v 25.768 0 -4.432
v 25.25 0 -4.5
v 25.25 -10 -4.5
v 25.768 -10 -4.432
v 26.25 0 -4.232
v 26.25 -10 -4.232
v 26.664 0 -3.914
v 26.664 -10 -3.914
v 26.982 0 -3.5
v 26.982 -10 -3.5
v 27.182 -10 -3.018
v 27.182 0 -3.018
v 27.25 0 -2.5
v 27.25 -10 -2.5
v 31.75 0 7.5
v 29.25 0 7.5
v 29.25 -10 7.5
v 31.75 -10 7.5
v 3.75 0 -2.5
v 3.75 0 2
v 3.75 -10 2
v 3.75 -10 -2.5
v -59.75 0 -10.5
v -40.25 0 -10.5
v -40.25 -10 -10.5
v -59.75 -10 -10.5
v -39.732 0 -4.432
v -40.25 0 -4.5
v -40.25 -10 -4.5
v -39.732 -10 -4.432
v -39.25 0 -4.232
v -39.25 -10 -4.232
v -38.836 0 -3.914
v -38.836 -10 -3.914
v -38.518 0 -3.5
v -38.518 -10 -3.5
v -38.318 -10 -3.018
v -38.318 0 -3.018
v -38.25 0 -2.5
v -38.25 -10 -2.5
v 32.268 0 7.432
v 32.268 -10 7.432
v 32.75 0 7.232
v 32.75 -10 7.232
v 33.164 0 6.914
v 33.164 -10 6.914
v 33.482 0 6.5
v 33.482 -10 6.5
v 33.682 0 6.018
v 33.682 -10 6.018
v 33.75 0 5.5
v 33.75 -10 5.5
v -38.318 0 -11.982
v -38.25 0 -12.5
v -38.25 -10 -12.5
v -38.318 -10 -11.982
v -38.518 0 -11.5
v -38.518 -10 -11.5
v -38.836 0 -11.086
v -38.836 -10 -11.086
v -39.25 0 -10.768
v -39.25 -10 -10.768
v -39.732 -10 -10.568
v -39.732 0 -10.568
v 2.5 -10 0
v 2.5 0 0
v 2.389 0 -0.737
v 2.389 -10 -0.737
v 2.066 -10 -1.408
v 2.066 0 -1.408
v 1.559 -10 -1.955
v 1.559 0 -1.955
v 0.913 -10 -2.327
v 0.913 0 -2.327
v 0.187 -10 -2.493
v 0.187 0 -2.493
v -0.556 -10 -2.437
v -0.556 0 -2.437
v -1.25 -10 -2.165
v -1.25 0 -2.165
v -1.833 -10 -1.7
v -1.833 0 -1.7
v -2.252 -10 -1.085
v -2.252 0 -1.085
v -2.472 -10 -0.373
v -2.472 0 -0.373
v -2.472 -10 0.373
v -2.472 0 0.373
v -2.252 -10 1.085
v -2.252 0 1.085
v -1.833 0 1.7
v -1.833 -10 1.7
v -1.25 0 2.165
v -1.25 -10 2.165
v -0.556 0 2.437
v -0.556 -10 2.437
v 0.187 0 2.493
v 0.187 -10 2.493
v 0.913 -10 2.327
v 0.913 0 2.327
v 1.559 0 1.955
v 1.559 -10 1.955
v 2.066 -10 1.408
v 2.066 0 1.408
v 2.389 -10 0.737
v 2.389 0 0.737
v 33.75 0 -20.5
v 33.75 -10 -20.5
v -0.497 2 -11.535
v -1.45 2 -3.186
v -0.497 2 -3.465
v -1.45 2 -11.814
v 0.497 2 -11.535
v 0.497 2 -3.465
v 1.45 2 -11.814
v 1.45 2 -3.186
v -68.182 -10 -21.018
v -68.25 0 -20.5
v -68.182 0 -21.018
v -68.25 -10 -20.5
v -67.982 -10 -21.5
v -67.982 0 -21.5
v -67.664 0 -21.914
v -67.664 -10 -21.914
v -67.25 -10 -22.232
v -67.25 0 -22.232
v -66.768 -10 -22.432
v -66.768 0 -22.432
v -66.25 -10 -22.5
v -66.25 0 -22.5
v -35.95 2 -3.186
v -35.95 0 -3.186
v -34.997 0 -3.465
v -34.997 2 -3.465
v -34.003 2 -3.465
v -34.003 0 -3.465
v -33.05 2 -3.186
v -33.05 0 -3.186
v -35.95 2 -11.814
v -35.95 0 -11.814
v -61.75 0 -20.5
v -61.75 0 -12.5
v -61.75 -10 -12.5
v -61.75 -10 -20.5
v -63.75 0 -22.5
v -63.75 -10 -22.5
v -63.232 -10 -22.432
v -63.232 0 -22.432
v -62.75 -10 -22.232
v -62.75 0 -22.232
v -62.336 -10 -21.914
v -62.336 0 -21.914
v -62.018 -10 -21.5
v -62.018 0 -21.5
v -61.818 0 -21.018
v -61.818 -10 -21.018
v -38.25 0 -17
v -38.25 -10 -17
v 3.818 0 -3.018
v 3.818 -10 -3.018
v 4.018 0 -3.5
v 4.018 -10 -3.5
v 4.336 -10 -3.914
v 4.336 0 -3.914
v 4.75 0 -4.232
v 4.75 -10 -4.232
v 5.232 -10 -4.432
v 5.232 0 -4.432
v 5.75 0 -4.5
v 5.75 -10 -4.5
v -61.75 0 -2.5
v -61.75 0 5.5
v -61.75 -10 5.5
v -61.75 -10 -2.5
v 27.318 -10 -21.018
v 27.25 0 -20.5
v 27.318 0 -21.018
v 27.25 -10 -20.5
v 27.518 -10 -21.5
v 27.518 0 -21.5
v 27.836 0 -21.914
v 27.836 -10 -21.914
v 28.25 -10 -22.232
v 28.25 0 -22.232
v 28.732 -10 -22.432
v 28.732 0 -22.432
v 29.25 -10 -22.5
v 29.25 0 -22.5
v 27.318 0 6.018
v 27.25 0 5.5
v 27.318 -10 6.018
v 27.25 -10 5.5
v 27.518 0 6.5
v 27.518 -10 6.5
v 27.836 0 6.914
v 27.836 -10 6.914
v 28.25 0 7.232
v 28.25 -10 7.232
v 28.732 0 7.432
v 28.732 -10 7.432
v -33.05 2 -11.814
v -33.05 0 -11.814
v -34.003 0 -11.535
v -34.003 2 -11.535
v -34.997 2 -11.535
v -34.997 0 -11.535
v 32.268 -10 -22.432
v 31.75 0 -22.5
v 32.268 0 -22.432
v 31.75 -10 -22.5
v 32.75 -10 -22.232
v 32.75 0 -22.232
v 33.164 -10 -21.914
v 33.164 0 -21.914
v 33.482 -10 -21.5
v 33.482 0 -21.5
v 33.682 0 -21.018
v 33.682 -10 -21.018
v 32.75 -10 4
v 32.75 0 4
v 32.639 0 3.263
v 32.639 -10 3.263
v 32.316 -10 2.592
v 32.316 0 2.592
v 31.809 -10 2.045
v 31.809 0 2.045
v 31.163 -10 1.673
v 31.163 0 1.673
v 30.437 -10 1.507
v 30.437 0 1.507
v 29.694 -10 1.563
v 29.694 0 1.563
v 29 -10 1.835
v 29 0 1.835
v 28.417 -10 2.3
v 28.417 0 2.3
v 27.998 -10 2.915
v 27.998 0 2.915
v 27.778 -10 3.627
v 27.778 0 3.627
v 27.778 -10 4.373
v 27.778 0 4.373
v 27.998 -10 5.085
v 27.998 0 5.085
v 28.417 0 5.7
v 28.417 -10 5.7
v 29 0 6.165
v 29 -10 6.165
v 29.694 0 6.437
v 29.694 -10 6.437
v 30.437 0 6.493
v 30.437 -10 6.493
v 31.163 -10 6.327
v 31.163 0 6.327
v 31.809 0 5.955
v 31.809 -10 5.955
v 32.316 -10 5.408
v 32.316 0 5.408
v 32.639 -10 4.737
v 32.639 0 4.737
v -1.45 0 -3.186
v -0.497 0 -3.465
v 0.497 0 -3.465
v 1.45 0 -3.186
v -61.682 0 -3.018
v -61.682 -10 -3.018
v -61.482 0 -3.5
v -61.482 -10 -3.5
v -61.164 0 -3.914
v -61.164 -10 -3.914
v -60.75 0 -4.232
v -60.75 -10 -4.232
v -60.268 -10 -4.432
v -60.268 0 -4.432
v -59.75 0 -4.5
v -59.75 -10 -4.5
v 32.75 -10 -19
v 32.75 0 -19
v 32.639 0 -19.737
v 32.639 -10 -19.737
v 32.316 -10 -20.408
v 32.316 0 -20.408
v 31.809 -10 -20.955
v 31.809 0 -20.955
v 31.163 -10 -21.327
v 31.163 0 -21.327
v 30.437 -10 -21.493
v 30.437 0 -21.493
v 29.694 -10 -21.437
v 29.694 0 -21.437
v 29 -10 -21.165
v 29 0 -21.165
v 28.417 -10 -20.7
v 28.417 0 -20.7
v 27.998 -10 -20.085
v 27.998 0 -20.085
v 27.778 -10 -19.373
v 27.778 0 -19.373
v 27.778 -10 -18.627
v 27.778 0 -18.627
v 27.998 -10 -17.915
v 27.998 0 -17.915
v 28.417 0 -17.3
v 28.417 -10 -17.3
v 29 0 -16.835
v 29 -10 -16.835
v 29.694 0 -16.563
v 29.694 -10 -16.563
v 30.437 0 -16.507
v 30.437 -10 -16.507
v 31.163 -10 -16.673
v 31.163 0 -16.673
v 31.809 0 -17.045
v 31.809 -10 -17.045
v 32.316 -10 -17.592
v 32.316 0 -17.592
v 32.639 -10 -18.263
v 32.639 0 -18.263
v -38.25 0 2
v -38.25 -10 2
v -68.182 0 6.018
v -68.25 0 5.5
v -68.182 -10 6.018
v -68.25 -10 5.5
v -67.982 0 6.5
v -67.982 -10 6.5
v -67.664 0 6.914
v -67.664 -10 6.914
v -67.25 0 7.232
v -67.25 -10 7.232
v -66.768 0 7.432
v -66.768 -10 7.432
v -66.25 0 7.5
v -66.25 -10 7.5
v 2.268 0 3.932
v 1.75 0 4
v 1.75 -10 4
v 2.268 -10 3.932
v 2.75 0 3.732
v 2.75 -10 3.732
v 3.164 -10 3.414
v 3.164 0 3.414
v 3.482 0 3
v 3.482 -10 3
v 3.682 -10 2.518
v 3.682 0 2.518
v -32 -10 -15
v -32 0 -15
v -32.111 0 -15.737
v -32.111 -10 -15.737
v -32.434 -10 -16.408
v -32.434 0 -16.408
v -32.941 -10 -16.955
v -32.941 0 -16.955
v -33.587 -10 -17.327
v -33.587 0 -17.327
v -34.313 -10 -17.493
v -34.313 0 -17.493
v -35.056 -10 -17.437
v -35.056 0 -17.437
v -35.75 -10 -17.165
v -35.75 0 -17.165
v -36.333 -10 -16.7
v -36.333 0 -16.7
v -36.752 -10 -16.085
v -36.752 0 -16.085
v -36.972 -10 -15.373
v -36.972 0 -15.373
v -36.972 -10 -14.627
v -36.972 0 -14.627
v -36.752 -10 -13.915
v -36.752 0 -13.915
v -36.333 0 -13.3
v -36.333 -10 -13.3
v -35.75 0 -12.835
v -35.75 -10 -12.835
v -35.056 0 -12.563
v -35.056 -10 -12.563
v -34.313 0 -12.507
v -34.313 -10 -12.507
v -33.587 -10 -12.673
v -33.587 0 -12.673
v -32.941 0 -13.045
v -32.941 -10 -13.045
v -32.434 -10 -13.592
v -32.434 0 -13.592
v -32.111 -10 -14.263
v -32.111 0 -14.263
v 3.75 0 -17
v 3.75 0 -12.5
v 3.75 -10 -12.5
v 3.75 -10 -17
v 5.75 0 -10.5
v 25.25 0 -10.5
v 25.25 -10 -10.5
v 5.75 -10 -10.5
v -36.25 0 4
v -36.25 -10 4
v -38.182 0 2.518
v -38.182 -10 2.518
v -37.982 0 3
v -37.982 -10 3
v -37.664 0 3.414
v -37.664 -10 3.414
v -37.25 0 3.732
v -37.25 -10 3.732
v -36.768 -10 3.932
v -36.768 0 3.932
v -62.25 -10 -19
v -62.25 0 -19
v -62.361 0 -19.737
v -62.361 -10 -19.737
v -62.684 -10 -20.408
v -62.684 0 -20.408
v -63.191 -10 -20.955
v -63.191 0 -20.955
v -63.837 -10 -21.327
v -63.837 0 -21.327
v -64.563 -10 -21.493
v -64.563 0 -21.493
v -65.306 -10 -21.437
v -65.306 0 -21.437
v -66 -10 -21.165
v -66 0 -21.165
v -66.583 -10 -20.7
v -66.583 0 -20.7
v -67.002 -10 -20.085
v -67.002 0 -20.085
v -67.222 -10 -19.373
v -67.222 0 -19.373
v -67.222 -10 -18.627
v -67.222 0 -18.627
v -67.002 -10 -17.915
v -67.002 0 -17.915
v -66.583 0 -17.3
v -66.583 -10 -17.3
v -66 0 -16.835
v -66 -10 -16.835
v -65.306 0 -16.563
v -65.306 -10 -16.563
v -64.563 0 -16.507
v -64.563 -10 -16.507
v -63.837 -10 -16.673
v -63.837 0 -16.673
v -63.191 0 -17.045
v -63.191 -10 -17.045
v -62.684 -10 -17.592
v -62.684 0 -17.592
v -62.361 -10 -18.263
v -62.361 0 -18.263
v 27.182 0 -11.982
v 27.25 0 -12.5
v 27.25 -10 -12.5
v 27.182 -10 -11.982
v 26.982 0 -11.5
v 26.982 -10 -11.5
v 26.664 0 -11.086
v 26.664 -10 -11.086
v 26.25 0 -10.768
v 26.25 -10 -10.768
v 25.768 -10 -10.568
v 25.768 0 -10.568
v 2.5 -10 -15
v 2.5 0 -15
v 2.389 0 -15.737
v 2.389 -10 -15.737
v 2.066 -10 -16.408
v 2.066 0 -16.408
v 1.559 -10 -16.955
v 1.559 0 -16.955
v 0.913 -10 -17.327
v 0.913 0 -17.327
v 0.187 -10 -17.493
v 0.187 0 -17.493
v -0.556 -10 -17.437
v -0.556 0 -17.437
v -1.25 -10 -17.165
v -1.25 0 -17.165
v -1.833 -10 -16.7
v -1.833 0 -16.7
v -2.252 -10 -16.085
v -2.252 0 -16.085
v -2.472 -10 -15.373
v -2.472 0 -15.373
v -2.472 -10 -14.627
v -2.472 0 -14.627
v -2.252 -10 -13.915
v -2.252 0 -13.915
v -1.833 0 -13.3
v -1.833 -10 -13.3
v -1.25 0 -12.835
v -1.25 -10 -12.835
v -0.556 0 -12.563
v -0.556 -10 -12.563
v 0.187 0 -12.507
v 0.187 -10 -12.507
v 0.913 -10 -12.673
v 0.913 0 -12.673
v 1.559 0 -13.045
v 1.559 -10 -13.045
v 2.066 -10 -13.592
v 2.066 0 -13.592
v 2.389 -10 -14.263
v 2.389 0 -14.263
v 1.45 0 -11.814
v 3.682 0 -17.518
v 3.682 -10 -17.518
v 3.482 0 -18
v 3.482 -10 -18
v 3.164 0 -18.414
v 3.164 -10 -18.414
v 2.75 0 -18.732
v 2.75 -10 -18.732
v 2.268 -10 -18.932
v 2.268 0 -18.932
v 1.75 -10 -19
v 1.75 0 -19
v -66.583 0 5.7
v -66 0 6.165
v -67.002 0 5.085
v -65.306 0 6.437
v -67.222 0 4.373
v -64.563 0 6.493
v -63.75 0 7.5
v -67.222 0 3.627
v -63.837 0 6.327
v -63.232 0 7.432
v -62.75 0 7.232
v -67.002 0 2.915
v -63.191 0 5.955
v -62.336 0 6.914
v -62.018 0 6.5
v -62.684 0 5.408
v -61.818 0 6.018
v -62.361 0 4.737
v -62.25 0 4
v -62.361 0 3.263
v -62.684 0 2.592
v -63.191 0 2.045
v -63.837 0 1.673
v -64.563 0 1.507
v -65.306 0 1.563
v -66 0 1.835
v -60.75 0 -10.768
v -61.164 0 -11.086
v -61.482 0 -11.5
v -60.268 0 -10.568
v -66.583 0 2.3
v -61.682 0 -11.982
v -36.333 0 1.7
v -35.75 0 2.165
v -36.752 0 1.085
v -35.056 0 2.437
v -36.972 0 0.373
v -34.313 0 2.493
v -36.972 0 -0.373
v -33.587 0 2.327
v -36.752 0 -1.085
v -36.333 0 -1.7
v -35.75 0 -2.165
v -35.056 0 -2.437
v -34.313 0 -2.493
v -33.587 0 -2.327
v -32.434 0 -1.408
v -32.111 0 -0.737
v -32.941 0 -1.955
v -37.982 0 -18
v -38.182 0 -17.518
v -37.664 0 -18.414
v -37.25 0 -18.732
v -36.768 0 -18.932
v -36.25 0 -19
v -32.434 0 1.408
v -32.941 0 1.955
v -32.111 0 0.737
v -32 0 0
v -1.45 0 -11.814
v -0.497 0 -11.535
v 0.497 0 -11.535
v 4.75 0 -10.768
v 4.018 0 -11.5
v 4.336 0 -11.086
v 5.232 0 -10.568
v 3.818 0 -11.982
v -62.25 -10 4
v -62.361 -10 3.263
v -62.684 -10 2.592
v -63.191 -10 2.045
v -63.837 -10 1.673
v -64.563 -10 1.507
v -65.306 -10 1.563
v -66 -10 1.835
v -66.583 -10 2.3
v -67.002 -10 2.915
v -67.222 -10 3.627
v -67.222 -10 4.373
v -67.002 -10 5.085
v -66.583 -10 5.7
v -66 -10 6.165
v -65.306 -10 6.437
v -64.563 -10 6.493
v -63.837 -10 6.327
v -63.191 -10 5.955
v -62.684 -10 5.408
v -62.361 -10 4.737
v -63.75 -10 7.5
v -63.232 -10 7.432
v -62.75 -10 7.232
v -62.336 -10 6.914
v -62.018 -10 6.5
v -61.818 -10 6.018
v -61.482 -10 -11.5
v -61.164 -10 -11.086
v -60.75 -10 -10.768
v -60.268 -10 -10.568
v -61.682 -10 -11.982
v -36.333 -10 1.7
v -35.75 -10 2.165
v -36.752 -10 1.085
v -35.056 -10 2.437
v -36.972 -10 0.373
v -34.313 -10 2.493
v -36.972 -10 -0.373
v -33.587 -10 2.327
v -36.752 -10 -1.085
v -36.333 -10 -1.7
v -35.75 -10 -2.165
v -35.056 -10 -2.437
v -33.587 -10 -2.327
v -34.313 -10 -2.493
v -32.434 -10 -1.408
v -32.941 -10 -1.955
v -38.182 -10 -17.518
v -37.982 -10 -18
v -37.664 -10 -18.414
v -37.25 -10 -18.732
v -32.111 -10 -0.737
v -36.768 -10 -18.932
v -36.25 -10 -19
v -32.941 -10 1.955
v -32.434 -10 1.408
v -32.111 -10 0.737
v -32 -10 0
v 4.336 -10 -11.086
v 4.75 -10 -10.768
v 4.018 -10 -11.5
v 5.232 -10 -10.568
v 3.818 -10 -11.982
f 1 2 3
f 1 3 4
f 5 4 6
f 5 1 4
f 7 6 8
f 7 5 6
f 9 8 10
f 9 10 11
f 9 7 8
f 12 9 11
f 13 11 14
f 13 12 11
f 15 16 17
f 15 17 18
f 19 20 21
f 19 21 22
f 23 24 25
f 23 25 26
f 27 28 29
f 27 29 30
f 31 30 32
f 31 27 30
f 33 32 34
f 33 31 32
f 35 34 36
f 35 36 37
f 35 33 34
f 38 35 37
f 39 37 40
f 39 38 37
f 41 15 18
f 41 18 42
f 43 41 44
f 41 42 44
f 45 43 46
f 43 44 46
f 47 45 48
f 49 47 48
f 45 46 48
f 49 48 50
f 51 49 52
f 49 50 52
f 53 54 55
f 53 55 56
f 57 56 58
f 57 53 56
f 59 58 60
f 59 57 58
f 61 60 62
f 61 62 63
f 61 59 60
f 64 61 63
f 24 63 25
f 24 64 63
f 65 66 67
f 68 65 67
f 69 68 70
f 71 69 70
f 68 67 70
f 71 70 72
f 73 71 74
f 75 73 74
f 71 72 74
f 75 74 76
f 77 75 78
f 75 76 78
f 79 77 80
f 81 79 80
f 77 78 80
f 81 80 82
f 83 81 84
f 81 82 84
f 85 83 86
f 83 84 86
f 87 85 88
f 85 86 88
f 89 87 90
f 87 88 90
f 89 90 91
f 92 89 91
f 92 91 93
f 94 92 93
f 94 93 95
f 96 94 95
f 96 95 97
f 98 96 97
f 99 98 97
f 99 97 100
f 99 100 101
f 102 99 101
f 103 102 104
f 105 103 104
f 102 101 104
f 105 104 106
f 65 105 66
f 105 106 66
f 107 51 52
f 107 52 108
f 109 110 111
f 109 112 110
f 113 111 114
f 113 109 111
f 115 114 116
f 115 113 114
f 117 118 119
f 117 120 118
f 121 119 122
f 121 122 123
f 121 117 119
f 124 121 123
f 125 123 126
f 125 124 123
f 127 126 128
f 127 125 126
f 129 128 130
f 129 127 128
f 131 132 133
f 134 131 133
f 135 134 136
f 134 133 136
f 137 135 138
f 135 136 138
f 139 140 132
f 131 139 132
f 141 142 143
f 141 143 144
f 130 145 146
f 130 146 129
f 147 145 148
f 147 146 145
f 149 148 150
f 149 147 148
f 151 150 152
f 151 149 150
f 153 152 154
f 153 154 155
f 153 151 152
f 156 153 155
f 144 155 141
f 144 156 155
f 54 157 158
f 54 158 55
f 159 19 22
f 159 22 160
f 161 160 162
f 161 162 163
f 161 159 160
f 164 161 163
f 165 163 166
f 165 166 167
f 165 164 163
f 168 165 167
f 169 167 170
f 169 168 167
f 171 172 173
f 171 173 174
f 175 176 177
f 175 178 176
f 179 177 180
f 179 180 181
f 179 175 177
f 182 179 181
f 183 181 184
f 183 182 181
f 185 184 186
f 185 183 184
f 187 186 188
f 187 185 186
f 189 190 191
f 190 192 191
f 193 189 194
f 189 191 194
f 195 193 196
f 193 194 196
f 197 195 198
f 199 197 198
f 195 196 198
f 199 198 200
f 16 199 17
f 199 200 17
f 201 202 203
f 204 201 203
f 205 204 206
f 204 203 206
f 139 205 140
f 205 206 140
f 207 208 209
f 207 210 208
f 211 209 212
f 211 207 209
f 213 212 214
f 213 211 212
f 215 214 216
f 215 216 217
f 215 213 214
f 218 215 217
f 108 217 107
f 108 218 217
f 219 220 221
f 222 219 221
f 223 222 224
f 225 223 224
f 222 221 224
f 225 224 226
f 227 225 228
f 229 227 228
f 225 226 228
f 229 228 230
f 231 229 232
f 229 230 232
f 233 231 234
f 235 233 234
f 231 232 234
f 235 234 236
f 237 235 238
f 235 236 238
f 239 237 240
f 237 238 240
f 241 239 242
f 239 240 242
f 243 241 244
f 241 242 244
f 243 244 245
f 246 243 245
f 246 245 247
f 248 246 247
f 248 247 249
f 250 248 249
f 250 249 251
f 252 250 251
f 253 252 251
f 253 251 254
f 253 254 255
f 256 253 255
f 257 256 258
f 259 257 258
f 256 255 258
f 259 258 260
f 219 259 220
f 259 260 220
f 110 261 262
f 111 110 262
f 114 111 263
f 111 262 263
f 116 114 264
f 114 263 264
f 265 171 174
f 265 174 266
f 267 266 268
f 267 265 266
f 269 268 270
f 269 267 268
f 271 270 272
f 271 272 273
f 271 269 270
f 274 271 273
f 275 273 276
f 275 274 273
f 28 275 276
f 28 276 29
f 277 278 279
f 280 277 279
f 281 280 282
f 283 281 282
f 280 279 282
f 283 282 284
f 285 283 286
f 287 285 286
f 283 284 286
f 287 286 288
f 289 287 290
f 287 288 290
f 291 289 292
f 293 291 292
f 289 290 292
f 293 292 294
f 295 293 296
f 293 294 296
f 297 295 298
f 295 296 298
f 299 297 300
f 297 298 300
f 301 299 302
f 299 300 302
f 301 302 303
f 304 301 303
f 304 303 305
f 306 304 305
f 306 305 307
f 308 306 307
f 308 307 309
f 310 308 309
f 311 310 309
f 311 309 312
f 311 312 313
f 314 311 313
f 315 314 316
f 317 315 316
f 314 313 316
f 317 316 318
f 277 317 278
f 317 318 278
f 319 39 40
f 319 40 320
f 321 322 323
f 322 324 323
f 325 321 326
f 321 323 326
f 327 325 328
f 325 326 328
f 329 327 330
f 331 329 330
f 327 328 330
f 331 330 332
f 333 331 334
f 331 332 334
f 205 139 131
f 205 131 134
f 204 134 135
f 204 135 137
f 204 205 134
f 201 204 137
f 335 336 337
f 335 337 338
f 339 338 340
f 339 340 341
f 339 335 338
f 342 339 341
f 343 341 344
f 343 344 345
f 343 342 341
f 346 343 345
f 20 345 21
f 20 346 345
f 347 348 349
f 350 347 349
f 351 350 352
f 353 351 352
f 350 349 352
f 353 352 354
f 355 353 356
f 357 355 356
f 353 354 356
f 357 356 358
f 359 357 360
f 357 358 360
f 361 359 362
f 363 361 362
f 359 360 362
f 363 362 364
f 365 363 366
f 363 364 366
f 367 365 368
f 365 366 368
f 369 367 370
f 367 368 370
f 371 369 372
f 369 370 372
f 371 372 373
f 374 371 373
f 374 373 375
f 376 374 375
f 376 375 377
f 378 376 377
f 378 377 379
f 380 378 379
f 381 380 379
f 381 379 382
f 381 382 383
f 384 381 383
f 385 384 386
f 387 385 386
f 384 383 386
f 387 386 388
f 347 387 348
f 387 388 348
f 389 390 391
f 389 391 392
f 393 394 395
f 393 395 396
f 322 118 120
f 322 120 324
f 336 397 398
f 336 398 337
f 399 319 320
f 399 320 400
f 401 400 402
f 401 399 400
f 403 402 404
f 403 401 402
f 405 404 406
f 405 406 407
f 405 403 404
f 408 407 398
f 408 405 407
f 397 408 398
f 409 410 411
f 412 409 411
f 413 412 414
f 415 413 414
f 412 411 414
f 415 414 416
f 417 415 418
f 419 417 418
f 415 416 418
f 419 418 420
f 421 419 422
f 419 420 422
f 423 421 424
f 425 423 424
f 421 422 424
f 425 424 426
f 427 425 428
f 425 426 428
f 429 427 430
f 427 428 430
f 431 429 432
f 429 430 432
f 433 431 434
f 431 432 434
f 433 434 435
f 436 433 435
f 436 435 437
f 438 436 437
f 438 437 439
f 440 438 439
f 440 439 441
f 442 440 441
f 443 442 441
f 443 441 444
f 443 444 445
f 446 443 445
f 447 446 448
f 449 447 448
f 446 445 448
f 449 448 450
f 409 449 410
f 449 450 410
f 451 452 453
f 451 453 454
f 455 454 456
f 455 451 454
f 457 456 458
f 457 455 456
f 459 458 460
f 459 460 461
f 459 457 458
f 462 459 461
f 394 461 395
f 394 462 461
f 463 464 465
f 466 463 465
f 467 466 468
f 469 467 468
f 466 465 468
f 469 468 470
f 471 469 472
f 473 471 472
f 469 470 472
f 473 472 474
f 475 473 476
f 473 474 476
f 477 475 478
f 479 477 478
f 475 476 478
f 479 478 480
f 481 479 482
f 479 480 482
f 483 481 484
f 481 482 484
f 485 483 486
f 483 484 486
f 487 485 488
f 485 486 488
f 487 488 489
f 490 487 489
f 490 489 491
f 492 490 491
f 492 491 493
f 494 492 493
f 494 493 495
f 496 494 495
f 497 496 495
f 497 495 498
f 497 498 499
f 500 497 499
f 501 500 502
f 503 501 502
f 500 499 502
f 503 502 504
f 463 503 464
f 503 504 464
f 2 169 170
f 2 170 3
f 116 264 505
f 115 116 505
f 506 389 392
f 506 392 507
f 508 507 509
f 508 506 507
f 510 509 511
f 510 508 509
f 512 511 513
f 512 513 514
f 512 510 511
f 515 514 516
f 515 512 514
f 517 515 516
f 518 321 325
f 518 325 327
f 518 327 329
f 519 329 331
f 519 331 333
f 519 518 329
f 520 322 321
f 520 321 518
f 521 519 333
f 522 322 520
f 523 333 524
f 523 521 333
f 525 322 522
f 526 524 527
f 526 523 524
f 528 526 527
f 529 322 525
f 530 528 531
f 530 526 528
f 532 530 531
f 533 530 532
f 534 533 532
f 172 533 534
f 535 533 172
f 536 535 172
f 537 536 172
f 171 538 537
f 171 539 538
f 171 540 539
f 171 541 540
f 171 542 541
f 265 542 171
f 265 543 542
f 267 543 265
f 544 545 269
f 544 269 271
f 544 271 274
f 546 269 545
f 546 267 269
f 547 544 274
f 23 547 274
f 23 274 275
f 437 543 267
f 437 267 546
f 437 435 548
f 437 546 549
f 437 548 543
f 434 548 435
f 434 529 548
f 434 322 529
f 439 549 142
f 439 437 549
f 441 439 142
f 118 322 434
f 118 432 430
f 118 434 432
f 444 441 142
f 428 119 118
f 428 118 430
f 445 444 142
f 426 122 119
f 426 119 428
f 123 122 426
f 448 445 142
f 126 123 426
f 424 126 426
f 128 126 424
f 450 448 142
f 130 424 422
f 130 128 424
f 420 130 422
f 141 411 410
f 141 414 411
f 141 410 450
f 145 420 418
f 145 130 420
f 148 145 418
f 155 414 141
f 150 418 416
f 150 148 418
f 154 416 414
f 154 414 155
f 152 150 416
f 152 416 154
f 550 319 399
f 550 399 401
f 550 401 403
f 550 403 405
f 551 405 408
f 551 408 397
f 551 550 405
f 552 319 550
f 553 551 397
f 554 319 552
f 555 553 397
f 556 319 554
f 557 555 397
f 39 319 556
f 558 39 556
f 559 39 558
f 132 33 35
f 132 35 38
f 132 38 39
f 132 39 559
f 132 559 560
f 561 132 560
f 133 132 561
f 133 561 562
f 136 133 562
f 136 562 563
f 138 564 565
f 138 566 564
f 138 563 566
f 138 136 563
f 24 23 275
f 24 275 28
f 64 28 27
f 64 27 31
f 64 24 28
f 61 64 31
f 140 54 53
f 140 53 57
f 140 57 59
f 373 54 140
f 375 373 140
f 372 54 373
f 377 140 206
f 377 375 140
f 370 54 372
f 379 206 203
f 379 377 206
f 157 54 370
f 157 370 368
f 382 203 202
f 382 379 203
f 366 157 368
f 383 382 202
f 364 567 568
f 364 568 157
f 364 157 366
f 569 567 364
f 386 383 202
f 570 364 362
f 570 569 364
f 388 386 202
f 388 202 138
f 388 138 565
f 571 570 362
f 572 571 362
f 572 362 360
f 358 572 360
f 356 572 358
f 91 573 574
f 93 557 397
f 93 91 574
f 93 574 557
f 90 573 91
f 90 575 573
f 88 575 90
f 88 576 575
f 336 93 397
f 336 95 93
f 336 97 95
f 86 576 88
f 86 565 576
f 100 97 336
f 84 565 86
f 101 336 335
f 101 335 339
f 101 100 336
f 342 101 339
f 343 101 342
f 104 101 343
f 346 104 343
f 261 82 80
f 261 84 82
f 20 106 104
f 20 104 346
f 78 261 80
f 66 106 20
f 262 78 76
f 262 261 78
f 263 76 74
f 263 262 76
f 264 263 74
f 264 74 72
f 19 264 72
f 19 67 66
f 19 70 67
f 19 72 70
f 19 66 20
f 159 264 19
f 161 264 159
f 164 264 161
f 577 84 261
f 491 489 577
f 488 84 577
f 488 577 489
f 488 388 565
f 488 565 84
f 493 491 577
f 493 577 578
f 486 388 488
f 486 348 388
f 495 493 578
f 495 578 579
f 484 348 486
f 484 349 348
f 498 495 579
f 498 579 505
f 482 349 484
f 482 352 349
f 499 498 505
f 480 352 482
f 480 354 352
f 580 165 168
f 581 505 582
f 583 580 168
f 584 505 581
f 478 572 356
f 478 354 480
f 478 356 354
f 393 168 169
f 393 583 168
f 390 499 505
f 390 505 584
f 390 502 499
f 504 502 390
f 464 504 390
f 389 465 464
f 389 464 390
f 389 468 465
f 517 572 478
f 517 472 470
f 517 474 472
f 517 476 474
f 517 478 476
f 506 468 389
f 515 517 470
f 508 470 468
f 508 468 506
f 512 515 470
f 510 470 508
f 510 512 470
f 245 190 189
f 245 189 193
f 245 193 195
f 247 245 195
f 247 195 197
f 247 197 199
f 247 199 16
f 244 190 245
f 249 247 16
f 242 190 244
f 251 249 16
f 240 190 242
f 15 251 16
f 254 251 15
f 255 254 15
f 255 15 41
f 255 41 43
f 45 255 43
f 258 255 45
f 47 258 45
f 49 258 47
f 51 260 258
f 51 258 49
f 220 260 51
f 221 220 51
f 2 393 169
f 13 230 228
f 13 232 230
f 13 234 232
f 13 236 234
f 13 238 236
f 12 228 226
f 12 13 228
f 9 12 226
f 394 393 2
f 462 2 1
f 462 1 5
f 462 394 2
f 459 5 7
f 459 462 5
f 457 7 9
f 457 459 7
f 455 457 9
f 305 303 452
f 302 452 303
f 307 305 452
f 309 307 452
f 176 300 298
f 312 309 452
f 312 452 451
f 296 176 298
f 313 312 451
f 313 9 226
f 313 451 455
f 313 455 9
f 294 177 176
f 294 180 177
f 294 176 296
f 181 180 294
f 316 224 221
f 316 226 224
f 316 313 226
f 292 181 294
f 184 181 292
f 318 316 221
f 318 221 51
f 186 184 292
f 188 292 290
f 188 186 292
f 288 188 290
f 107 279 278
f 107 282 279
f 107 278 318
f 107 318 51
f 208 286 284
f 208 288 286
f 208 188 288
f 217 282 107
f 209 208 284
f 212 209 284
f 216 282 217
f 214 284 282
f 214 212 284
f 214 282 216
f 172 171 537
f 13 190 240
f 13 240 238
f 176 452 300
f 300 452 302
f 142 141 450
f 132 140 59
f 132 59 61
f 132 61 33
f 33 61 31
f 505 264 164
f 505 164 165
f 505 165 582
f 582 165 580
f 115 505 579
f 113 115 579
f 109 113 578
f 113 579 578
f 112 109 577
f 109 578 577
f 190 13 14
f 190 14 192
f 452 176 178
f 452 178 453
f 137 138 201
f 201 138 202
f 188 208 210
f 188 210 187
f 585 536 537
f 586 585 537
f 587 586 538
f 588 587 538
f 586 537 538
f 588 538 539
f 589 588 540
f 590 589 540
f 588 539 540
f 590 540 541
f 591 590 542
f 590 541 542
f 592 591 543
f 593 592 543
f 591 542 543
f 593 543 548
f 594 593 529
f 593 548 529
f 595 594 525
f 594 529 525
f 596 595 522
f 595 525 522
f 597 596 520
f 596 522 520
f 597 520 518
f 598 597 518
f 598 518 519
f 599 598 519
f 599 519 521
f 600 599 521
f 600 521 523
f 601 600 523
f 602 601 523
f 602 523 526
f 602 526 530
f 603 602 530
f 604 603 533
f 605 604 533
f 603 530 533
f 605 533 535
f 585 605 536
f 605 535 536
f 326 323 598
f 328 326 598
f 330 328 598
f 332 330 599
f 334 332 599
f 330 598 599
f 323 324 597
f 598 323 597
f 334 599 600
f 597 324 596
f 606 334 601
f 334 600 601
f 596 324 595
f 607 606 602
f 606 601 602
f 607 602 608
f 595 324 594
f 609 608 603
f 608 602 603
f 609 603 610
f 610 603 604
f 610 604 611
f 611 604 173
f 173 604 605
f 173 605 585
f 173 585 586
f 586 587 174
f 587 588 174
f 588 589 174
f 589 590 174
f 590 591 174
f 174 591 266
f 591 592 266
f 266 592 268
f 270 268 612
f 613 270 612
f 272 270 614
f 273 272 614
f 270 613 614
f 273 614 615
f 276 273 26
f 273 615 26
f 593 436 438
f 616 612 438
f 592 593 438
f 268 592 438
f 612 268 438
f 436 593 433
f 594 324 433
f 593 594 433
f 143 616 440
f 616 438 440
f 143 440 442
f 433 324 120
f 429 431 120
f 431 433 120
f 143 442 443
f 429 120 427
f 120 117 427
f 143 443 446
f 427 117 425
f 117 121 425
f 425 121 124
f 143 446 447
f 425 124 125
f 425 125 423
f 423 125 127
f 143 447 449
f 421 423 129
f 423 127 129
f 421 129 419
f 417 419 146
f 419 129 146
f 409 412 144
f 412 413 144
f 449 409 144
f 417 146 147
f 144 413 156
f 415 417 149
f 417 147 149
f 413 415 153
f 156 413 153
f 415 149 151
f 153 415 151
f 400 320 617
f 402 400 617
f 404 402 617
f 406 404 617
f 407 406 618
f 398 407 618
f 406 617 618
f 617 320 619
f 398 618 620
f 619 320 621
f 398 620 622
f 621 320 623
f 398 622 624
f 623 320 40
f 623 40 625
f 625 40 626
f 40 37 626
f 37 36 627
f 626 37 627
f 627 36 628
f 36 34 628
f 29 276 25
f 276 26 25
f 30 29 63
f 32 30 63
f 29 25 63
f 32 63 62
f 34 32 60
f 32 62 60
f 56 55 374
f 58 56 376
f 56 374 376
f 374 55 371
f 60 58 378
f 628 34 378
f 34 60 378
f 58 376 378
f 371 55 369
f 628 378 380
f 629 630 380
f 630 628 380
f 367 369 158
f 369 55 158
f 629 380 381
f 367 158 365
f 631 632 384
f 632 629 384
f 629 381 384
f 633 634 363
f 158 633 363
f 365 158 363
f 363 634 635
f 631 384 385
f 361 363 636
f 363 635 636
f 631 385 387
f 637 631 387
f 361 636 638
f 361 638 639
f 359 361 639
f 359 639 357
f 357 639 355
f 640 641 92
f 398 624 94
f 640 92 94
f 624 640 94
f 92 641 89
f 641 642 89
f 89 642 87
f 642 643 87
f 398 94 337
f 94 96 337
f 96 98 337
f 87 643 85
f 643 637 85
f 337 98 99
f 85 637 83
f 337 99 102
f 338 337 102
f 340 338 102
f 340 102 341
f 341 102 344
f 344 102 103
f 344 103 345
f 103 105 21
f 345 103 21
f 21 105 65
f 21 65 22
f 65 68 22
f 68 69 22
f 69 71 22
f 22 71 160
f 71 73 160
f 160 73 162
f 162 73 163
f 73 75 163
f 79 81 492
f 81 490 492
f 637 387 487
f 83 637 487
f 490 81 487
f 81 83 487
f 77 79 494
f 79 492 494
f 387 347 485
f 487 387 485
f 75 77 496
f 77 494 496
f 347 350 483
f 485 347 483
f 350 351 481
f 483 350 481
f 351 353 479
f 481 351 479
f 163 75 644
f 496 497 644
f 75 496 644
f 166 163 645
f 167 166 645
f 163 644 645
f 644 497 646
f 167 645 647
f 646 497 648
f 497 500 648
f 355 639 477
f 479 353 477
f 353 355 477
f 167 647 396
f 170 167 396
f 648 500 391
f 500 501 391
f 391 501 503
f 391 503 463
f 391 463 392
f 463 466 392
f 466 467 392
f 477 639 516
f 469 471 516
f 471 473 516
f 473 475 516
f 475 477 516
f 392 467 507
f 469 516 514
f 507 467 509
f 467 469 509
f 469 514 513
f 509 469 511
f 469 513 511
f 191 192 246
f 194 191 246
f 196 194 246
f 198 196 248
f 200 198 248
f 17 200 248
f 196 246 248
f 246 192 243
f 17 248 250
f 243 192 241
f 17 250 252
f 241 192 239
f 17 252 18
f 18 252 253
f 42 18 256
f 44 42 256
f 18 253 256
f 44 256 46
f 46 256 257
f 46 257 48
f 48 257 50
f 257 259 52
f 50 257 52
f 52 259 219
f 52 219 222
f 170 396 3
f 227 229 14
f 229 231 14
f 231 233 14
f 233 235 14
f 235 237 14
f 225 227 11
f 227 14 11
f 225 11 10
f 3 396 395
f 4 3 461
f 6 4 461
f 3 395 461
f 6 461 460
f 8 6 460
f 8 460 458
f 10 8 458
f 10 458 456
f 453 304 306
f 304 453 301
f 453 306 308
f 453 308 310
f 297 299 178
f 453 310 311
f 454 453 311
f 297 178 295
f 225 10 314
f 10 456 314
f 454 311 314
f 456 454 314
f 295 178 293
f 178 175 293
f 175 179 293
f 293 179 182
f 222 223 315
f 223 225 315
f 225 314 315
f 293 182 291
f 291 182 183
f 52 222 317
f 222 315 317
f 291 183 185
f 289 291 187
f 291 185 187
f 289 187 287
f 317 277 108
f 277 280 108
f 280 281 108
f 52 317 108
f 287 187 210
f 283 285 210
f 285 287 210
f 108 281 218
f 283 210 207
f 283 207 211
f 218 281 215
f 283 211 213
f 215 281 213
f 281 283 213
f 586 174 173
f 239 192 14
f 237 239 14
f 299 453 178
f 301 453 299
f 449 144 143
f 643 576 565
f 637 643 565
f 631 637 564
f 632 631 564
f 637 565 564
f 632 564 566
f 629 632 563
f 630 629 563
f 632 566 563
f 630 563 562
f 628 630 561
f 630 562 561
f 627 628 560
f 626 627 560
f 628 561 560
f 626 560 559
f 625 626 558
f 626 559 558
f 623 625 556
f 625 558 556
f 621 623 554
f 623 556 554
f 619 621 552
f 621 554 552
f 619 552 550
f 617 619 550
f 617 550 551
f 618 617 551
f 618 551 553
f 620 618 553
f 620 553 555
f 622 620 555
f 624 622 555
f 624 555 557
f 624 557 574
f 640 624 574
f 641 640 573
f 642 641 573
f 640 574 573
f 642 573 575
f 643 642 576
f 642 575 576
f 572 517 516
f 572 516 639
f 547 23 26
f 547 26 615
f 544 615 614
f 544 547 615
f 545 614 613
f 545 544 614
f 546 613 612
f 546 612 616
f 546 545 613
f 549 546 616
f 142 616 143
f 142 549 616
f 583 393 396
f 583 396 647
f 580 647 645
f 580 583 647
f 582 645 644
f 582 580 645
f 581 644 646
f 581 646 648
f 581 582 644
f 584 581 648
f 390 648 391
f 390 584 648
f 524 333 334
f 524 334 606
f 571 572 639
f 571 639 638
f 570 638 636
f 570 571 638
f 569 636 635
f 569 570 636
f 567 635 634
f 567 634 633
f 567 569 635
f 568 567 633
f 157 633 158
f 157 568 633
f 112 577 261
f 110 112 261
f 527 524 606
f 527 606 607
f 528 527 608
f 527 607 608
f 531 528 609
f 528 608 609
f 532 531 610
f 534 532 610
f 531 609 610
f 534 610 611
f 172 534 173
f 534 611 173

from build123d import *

# Parameters (mm, degrees)
SKETCH2_R           = 2.5
BOSS_EXTRUDE1_DEPTH = 10
BOSS_EXTRUDE2_DEPTH = 2
FILLET1_R           = 2


with BuildPart() as part:
    # Sketch2 → Boss-Extrude1 (new body)
    with BuildSketch(Plane(origin=(0, 0, 0), x_dir=(1, 0, 0), z_dir=(0, 1, 0))):
        with BuildLine():
            Line((-68.25, 22.5), (-68.25, -7.5))
            Line((-68.25, -7.5), (-61.75, -7.5))
            Line((-61.75, -7.5), (-61.75, 2.5))
            ThreePointArc((-61.75, 2.5), (-61.164213562, 3.914213562), (-59.75, 4.5))
            Line((-59.75, 4.5), (-40.25, 4.5))
            ThreePointArc((-40.25, 4.5), (-38.835786438, 3.914213562), (-38.25, 2.5))
            Line((-38.25, 2.5), (-38.25, -2))
            ThreePointArc((-38.25, -2), (-37.664213562, -3.414213562), (-36.25, -4))
            Line((-36.25, -4), (1.75, -4))
            ThreePointArc((1.75, -4), (3.164213562, -3.414213562), (3.75, -2))
            Line((3.75, -2), (3.75, 2.5))
            ThreePointArc((3.75, 2.5), (4.335786438, 3.914213562), (5.75, 4.5))
            Line((5.75, 4.5), (25.25, 4.5))
            ThreePointArc((25.25, 4.5), (26.664213562, 3.914213562), (27.25, 2.5))
            Line((27.25, 2.5), (27.25, -7.5))
            Line((27.25, -7.5), (33.75, -7.5))
            Line((33.75, -7.5), (33.75, 22.5))
            Line((33.75, 22.5), (27.25, 22.5))
            Line((27.25, 22.5), (27.25, 12.5))
            ThreePointArc((27.25, 12.5), (26.664213562, 11.085786438), (25.25, 10.5))
            Line((25.25, 10.5), (5.75, 10.5))
            ThreePointArc((5.75, 10.5), (4.335786438, 11.085786438), (3.75, 12.5))
            Line((3.75, 12.5), (3.75, 17))
            ThreePointArc((3.75, 17), (3.164213562, 18.414213562), (1.75, 19))
            Line((1.75, 19), (-36.25, 19))
            ThreePointArc((-36.25, 19), (-37.664213562, 18.414213562), (-38.25, 17))
            Line((-38.25, 17), (-38.25, 12.5))
            ThreePointArc((-38.25, 12.5), (-38.835786438, 11.085786438), (-40.25, 10.5))
            Line((-40.25, 10.5), (-59.75, 10.5))
            ThreePointArc((-59.75, 10.5), (-61.164213562, 11.085786438), (-61.75, 12.5))
            Line((-61.75, 12.5), (-61.75, 22.5))
            Line((-61.75, 22.5), (-68.25, 22.5))
        make_face()
        with Locations((-34.5, 0)):
            Circle(SKETCH2_R, mode=Mode.SUBTRACT)
        Circle(SKETCH2_R, mode=Mode.SUBTRACT)
        with Locations((-34.5, 15)):
            Circle(SKETCH2_R, mode=Mode.SUBTRACT)
        with Locations((0, 15)):
            Circle(SKETCH2_R, mode=Mode.SUBTRACT)
        with Locations((30.25, 19)):
            Circle(SKETCH2_R, mode=Mode.SUBTRACT)
        with Locations((30.25, -4)):
            Circle(SKETCH2_R, mode=Mode.SUBTRACT)
        with Locations((-64.75, -4)):
            Circle(SKETCH2_R, mode=Mode.SUBTRACT)
        with Locations((-64.75, 19)):
            Circle(SKETCH2_R, mode=Mode.SUBTRACT)
    extrude(amount=-BOSS_EXTRUDE1_DEPTH)

    # Sketch3 → Boss-Extrude2 (add)
    with BuildSketch(Plane(origin=(0, 0, 0), x_dir=(1, 0, 0), z_dir=(0, 1, 0))):
        with BuildLine():
            Line((-35.95, 11.814485913), (-35.95, 3.185514087))
            ThreePointArc((-35.95, 3.185514087), (-34.5, 3.5), (-33.05, 3.185514087))
            Line((-33.05, 3.185514087), (-33.05, 11.814485913))
            ThreePointArc((-33.05, 11.814485913), (-34.5, 11.5), (-35.95, 11.814485913))
        make_face()
        with BuildLine():
            ThreePointArc((-1.45, 3.185514087), (0, 3.5), (1.45, 3.185514087))
            Line((1.45, 3.185514087), (1.45, 11.814485913))
            ThreePointArc((1.45, 11.814485913), (0, 11.5), (-1.45, 11.814485913))
            Line((-1.45, 11.814485913), (-1.45, 3.185514087))
        make_face()
    extrude(amount=BOSS_EXTRUDE2_DEPTH)

    # Fillet1
    fillet1_edges = [part.edges().sort_by_distance(p)[0] for p in [
        (27.25, -5, -22.5),
        (33.75, -5, -22.5),
        (33.75, -5, 7.5),
        (27.25, -5, 7.5),
        (-61.75, -5, 7.5),
        (-68.25, -5, 7.5),
        (-68.25, -5, -22.5),
        (-61.75, -5, -22.5),
    ]]
    fillet(fillet1_edges, radius=FILLET1_R)


solid = part.part
